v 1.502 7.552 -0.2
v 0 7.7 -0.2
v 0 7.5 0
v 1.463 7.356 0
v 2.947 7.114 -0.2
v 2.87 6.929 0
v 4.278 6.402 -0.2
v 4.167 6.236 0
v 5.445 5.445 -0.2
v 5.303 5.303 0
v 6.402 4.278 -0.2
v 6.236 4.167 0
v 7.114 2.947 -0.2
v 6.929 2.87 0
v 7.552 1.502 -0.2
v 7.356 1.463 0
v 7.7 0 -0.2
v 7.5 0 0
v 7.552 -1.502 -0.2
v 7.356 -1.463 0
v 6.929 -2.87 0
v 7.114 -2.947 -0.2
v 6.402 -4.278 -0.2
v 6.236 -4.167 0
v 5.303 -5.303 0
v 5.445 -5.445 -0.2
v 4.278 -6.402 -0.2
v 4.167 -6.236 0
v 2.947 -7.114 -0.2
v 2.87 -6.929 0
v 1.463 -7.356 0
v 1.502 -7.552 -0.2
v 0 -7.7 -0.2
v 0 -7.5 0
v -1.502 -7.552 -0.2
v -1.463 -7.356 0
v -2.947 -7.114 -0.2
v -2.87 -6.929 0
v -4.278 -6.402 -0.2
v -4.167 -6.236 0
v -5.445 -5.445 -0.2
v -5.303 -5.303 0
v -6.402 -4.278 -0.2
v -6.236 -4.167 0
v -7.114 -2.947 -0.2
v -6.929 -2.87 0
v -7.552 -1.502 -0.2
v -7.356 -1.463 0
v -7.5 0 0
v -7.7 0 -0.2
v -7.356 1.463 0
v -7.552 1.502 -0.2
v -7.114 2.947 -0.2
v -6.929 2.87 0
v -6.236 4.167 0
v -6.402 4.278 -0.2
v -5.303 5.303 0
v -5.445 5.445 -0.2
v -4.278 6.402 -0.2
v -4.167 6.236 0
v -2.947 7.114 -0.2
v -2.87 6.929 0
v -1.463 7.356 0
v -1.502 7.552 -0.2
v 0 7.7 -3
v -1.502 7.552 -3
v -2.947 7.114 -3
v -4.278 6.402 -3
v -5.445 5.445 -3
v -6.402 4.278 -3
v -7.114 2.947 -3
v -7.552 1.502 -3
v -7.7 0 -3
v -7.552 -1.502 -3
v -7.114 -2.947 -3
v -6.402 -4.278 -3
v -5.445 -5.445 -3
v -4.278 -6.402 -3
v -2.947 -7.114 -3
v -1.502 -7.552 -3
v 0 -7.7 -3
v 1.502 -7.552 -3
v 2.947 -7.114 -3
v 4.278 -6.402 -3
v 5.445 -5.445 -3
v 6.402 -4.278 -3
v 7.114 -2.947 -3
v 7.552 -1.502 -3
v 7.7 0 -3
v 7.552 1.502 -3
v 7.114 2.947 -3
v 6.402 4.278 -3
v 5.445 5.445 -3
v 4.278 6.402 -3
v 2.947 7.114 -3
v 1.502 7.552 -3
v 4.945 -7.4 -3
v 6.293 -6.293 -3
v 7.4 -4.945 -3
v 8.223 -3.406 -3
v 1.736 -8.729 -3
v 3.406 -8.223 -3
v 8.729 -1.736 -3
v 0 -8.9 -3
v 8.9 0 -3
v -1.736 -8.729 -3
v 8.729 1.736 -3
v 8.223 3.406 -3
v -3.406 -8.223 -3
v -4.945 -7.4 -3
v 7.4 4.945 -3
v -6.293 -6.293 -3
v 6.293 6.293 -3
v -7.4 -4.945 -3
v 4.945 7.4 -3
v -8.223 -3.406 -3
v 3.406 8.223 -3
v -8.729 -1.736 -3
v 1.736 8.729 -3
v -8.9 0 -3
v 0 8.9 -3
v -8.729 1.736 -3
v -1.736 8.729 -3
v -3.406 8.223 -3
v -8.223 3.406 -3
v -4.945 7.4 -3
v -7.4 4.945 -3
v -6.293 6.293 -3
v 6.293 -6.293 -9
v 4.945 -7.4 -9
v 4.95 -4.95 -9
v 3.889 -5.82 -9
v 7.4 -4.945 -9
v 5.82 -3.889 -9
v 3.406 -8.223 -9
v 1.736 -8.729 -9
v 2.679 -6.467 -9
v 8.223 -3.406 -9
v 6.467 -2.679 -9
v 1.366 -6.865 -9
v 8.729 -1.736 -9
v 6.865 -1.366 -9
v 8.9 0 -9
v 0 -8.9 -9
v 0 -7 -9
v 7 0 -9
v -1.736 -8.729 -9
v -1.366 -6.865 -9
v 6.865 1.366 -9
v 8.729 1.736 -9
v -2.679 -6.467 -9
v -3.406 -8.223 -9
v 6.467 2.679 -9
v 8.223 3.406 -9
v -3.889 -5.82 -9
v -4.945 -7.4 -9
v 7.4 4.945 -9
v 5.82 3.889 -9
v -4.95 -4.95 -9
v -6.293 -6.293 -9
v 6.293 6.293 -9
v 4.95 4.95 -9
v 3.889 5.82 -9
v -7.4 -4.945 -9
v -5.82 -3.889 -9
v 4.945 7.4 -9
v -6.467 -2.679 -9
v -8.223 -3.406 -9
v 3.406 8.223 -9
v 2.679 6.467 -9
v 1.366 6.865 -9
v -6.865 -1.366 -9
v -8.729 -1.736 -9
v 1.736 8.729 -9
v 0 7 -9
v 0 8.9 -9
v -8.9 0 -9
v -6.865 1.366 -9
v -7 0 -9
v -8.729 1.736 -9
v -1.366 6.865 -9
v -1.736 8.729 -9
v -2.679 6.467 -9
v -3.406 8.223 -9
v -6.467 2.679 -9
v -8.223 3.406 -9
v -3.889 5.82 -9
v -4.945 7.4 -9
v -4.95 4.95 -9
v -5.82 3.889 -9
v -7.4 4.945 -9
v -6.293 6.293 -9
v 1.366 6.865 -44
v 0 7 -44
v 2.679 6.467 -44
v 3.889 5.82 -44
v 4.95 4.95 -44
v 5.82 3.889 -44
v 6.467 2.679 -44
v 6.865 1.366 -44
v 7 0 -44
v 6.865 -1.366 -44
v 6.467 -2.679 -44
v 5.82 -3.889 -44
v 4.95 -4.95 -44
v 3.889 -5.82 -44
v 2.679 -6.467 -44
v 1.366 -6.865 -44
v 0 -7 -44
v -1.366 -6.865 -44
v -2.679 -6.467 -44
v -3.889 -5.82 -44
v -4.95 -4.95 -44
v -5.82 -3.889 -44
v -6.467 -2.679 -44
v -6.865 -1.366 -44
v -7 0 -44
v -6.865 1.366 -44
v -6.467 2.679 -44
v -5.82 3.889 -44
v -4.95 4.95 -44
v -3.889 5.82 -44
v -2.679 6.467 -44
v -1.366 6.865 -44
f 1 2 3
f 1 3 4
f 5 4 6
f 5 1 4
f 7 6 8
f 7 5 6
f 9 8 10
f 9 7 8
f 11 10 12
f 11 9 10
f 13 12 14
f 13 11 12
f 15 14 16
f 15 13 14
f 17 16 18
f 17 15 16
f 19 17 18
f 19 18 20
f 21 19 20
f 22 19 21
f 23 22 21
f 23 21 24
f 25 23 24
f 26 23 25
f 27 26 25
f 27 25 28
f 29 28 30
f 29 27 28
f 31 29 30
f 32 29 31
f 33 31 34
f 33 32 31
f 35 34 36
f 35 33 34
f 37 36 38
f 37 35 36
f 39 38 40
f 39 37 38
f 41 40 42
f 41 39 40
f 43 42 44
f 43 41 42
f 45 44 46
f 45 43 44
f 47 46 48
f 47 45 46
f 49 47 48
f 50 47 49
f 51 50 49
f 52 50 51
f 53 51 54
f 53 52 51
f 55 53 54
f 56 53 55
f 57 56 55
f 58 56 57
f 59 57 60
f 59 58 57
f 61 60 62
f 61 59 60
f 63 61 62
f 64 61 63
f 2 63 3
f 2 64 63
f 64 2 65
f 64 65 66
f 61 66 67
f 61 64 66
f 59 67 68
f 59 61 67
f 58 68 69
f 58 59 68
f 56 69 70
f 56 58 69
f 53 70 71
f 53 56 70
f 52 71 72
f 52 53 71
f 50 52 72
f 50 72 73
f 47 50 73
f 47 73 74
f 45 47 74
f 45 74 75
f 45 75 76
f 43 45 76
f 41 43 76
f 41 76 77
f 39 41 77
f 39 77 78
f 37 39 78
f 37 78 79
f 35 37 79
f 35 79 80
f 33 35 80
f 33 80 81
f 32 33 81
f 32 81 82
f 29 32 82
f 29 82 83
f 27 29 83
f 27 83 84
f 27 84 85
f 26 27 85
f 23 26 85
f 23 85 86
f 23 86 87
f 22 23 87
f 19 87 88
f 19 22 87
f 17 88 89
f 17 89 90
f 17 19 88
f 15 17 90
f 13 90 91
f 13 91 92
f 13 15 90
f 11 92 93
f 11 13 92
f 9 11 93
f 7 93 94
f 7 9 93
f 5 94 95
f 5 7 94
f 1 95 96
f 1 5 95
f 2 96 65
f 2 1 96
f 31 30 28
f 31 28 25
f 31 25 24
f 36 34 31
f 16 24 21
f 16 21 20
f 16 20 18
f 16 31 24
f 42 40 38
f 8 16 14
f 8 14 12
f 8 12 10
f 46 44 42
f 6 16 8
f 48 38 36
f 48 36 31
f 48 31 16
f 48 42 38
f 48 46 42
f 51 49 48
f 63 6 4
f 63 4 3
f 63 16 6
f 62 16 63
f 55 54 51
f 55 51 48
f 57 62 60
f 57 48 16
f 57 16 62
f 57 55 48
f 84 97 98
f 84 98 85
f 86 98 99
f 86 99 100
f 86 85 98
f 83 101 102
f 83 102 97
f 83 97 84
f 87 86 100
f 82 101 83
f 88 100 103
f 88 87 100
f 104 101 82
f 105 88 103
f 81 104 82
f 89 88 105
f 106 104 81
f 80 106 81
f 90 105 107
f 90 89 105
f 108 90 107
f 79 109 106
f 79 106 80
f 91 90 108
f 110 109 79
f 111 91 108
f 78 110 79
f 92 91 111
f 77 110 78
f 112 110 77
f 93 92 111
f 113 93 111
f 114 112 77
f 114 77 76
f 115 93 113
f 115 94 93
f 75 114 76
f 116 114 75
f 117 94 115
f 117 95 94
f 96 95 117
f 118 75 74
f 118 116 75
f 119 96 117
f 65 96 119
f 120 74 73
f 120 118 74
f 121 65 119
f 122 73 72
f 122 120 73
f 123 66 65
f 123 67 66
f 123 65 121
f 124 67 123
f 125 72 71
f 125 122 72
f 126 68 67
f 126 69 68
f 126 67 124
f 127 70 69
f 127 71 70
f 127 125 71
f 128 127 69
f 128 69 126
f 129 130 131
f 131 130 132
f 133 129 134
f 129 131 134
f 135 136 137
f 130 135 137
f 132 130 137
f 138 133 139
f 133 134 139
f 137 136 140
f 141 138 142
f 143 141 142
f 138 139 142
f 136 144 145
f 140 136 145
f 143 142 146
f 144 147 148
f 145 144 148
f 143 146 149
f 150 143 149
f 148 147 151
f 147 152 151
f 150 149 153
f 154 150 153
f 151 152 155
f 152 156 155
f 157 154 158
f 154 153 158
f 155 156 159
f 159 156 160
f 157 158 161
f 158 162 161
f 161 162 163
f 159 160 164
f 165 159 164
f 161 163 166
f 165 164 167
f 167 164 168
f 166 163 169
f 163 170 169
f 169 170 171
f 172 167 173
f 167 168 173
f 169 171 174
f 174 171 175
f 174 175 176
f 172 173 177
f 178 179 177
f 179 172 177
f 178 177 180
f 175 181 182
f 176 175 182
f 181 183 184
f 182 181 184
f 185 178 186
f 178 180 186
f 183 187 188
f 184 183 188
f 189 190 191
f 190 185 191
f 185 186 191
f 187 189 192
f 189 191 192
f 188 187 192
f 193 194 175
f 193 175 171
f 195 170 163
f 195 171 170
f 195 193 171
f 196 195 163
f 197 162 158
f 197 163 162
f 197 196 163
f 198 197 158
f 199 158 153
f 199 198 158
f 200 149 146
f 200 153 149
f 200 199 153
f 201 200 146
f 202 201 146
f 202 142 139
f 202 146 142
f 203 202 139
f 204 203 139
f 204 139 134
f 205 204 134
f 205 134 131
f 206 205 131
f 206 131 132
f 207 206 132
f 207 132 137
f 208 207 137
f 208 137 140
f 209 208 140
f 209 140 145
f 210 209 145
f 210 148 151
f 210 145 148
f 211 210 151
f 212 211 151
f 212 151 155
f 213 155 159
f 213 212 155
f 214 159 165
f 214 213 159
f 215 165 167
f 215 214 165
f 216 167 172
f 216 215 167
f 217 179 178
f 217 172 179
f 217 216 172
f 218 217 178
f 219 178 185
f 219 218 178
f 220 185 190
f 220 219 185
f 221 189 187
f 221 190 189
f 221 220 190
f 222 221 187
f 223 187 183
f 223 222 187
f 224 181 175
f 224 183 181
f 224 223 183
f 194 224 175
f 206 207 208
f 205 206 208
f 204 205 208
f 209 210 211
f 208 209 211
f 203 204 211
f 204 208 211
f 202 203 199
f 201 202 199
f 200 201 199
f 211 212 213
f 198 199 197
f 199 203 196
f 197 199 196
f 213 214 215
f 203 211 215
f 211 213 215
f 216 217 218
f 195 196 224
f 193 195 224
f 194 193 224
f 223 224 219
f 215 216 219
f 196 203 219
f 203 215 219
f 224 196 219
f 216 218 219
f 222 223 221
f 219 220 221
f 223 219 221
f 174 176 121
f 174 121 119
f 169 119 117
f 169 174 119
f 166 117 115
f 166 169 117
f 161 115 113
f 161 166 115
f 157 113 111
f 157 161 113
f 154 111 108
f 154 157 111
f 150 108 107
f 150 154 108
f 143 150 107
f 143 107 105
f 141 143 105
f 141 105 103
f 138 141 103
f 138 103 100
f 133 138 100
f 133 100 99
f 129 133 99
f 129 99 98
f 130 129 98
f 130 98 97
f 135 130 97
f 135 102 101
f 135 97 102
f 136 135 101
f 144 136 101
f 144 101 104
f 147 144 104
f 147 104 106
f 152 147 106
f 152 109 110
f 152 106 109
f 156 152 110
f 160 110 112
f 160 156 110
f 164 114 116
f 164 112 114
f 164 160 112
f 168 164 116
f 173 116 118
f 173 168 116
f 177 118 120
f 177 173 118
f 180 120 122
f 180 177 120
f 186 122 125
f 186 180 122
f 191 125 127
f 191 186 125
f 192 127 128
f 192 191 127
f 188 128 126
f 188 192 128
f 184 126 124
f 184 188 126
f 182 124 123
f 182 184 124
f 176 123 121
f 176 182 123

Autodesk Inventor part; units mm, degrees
ref_plane "YZ Plane" through (0, 0, 0) normal (1, 0, 0) x (0, 1, 0)
ref_plane "XZ Plane" through (0, 0, 0) normal (0, 1, 0) x (-1, 0, 0)
ref_plane "XY Plane" through (0, 0, 0) normal (0, 0, 1) x (1, 0, 0)
sketch "スケッチ1" plane through (0, 0, 0) normal (1, 0, 0) x (0, 1, 0)
  line L0 (8.9, -3) -> (8.9, -9)
  line L1 (8.9, -9) -> (7, -9)
  line L2 (7, -9) -> (7, -44)
  line L3 (7, -44) -> (0, -44)
  line L4 (0, -44) -> (0, 0)
  line L5 (8.9, -3) -> (7.7, -3)
  line L6 (7.7, -3) -> (7.7, 0)
  line L7 (7.7, 0) -> (0, 0)
  dimension "d0" = 8.9
  dimension "d1" = 3
  dimension "d2" = 9
  dimension "d4" = 7.7
  dimension "d5" = 7
  dimension "d10" = 35
revolve "回転1" add sketch "スケッチ1" angle 360 about axis through (0, 0, -44) along (0, 0, 1)
chamfer "面取り1" distance 0.2 angle 45 1 edges at (0, -7.7, 0)
properties part number "AP6MS54G" material "ABS プラスチック"
